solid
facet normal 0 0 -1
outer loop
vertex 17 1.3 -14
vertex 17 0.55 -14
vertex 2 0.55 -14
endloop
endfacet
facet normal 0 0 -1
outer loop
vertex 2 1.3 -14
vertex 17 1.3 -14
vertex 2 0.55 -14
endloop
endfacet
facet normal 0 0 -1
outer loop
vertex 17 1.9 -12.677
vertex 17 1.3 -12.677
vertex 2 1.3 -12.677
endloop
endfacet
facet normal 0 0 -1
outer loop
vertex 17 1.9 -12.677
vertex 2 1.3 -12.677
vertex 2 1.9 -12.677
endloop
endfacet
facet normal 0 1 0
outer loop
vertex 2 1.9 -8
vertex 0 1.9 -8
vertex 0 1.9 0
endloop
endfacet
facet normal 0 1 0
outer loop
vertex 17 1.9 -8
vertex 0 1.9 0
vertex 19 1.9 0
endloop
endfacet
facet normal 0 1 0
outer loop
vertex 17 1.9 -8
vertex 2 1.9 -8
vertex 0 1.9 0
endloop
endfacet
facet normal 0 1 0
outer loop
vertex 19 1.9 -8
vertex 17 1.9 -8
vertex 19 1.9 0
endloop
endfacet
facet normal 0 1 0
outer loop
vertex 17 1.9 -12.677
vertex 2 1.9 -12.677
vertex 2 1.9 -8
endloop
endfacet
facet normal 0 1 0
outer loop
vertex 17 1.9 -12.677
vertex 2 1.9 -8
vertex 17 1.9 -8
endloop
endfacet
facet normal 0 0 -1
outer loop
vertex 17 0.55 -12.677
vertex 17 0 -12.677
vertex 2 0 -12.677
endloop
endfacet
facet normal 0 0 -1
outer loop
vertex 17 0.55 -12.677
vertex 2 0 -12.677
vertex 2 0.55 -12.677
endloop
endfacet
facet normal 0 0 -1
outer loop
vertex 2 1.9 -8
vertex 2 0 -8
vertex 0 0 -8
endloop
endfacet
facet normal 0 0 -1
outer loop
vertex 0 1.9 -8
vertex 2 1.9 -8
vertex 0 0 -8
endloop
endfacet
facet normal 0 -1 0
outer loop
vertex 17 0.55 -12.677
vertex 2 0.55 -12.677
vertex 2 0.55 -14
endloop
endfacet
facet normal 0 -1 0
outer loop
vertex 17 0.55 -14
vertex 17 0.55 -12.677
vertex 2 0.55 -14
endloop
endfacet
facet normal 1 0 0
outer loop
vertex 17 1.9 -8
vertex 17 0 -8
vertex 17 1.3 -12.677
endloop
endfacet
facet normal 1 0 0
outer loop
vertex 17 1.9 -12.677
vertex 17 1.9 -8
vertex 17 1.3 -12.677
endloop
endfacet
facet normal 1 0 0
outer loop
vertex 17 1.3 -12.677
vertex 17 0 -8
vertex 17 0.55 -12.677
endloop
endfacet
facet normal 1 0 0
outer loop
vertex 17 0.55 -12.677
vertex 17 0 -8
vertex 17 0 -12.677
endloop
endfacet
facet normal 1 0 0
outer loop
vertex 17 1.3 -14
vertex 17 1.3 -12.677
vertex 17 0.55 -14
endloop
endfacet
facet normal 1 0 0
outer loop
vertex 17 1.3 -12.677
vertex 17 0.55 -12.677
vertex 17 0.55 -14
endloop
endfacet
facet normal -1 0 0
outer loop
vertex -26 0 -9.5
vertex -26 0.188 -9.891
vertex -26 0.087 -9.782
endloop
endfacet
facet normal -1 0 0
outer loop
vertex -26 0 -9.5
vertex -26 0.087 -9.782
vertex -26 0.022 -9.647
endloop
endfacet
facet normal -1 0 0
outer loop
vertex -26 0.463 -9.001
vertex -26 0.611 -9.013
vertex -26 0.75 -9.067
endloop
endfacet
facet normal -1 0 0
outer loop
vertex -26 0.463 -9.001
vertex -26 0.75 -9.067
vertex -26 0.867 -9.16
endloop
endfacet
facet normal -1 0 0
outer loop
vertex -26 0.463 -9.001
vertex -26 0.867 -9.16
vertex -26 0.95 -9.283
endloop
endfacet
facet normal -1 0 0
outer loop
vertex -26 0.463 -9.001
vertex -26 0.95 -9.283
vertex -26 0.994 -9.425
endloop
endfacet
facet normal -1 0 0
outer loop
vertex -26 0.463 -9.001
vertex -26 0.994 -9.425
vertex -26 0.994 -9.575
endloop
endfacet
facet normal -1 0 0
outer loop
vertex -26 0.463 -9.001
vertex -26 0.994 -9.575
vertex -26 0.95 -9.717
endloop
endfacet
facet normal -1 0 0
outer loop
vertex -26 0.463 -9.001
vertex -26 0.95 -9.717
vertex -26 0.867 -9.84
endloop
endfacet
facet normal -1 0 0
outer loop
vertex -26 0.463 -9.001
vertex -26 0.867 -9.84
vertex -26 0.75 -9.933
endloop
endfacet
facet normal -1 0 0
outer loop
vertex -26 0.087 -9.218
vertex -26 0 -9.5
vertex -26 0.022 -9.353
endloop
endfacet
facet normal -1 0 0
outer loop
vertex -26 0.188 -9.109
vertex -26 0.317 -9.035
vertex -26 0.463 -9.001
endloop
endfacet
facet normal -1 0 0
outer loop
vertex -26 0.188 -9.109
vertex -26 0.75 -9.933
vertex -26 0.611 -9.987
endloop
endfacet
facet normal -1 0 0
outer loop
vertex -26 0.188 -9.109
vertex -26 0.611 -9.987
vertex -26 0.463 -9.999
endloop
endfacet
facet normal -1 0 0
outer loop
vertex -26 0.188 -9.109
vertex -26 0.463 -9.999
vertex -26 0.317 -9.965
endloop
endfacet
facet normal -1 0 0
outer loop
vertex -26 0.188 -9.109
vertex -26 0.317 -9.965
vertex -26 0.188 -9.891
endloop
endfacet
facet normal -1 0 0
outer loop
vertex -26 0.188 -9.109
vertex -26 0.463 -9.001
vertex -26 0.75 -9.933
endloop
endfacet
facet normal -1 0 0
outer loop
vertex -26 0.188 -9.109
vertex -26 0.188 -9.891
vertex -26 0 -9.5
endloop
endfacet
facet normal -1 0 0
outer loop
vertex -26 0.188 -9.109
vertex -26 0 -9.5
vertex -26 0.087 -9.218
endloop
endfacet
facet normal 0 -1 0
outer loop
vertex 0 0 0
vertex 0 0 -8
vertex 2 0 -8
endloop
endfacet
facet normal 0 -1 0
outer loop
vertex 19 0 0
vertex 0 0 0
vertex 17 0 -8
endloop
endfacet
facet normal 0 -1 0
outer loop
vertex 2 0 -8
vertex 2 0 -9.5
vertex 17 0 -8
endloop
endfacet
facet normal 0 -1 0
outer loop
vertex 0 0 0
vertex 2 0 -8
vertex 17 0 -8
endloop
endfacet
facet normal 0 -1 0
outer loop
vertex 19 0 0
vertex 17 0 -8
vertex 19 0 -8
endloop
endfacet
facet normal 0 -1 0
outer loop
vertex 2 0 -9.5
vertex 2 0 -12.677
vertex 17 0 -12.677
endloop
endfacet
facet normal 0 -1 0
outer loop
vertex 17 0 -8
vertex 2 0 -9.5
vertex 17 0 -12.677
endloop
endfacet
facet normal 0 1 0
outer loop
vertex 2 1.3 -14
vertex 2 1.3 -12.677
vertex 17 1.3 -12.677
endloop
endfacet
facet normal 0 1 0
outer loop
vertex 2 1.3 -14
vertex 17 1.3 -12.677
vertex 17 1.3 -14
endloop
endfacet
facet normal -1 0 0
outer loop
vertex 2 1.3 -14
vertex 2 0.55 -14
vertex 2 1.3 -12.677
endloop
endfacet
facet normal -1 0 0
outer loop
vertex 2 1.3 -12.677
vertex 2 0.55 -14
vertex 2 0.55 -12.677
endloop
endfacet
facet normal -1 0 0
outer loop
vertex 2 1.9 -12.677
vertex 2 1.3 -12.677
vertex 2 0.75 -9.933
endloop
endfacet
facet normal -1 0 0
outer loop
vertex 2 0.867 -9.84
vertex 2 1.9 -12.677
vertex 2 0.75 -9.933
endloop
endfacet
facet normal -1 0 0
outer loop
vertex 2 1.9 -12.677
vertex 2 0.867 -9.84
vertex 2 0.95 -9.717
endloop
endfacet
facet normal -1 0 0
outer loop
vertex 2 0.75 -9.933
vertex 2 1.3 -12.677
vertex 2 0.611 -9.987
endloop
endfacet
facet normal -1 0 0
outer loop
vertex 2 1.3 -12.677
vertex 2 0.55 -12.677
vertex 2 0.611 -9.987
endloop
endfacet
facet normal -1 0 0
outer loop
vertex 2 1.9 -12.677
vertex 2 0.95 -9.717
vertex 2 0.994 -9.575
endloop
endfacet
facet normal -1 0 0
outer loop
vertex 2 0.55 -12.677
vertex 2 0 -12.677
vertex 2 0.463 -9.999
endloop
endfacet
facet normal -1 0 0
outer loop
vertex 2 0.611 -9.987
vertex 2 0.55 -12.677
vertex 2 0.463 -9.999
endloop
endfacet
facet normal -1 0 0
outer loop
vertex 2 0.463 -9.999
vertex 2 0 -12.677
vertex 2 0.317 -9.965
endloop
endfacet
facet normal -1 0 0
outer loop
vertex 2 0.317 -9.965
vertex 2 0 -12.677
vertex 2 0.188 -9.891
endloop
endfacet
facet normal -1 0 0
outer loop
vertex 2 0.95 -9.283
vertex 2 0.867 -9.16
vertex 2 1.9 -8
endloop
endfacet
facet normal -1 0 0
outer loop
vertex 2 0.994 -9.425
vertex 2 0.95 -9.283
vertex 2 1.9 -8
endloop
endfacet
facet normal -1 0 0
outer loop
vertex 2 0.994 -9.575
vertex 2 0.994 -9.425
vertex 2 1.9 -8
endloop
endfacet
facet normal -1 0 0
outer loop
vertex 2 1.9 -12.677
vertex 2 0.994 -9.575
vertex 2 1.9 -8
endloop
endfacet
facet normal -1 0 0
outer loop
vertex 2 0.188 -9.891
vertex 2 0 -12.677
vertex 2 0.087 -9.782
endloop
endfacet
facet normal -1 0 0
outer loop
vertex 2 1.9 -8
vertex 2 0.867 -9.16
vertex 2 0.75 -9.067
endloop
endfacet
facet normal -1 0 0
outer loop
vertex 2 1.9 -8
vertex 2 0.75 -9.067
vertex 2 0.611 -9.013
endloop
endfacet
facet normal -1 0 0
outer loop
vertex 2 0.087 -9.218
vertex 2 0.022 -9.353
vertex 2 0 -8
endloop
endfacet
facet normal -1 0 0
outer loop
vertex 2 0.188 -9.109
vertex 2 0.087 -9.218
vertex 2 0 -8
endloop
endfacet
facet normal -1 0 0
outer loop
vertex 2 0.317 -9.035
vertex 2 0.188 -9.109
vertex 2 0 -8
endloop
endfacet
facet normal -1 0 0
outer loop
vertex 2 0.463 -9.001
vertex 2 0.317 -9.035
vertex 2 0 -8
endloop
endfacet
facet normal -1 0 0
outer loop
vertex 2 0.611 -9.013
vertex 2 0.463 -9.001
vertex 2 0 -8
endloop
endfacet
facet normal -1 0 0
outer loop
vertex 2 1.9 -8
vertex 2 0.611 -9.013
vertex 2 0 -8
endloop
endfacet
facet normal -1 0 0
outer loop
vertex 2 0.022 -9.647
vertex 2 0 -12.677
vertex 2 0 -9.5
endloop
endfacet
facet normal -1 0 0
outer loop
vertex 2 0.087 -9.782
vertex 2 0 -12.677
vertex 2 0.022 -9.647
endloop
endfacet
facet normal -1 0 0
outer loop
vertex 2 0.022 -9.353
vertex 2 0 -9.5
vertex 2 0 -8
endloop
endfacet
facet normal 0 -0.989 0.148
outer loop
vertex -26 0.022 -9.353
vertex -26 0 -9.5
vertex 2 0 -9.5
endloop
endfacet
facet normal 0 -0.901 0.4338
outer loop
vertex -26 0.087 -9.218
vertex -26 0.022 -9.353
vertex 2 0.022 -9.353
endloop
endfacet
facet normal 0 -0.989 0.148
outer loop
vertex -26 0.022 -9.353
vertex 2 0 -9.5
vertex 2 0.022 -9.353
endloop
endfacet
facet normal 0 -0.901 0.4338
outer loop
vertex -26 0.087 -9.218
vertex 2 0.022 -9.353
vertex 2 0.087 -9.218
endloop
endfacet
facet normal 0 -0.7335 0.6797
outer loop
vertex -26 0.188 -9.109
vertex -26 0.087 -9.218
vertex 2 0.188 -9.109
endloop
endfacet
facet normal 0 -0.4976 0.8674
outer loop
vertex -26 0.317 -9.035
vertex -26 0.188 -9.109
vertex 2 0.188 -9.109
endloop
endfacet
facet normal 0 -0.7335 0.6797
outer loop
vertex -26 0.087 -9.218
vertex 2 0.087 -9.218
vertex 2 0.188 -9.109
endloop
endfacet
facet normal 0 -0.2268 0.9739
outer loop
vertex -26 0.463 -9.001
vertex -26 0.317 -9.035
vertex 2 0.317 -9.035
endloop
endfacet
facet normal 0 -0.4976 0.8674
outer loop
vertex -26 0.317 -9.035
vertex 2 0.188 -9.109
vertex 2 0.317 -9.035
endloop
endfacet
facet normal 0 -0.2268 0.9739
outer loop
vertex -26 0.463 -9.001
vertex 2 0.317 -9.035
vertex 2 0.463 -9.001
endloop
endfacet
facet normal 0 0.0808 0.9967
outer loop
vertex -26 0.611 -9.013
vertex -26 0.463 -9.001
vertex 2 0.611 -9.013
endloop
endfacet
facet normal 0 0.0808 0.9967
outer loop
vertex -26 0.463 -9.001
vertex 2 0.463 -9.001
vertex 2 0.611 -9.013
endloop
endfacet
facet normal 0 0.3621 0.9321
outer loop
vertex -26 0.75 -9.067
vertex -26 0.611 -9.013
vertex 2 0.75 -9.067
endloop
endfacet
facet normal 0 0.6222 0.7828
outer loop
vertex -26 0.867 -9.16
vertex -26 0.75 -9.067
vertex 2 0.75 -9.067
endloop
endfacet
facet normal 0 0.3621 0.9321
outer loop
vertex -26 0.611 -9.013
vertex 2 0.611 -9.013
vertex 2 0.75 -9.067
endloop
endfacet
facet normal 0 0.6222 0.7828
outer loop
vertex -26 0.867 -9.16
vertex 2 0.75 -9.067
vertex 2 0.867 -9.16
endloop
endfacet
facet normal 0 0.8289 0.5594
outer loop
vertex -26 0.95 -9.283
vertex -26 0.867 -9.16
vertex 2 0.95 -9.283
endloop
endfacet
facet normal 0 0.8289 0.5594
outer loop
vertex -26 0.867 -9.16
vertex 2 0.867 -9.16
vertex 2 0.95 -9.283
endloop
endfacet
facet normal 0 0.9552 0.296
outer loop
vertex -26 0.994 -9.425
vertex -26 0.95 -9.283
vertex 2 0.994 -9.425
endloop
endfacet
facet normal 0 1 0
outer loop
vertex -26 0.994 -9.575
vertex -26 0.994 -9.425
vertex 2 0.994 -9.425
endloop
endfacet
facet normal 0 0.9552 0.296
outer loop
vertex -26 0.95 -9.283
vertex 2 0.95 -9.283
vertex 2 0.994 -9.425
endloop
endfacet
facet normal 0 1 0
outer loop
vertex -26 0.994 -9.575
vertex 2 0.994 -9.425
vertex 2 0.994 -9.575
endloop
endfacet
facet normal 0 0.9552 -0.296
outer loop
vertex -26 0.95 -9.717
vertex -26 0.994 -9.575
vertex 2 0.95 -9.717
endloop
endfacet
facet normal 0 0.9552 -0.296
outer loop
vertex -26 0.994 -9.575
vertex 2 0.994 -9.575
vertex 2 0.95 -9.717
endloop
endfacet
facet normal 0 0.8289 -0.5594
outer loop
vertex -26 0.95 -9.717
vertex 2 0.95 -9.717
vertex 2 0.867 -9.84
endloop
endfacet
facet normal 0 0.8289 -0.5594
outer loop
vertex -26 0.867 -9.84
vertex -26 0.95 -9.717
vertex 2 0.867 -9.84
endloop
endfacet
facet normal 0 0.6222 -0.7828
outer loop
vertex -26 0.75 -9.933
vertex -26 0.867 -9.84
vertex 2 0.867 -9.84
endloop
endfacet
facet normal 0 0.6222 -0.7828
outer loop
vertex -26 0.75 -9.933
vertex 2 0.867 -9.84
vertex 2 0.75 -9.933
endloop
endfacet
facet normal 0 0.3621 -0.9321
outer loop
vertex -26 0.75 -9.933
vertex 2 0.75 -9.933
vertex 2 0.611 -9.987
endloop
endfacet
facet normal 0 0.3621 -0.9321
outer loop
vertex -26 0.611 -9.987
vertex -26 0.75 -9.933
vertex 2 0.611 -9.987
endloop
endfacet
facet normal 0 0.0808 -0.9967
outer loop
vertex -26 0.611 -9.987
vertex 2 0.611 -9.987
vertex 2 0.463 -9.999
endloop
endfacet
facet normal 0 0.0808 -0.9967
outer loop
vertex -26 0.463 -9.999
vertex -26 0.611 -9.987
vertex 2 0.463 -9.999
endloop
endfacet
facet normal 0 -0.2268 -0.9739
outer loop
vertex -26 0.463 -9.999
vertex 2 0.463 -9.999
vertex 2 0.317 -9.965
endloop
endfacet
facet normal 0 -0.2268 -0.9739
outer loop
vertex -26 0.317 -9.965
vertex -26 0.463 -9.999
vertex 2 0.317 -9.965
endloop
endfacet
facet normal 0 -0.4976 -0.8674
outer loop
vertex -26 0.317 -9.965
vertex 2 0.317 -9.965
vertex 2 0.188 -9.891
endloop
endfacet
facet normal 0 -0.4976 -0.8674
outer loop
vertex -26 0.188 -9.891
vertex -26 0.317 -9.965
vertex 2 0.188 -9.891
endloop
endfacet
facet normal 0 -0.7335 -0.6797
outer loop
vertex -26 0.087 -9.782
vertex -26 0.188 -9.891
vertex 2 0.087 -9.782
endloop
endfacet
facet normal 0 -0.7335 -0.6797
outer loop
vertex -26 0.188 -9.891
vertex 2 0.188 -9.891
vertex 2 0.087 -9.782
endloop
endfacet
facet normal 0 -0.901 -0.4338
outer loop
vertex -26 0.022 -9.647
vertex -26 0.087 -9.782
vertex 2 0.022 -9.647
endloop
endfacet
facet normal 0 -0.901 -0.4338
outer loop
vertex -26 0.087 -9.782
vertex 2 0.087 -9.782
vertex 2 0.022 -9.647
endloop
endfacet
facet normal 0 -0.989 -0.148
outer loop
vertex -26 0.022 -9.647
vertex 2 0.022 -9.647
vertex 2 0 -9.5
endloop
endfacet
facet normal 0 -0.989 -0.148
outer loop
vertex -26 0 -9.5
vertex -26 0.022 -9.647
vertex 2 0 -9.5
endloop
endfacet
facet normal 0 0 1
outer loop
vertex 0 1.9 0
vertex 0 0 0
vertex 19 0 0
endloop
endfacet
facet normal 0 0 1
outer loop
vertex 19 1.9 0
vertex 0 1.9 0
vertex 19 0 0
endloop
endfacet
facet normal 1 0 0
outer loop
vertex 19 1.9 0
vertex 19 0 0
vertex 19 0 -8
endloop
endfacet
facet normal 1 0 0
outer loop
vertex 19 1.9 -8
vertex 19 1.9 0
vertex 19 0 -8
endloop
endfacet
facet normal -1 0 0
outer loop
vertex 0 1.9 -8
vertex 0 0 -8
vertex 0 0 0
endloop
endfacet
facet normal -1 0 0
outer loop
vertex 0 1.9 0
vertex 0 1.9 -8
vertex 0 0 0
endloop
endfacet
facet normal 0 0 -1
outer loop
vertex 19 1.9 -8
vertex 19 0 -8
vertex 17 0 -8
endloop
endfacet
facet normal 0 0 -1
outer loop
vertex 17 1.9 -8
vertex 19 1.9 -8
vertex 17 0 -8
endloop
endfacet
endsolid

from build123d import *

# Parameters (mm, degrees)
AUFSATZ_LINEAR_AUSTRAGEN1_DEPTH = 1.9
SKIZZE4_R                       = 0.5
AUFSATZ_LINEAR_AUSTRAGEN3_DEPTH = 28
SKIZZE5_W                       = 1.322669318
SKIZZE5_H                       = 0.6
SKIZZE5_H_2                     = 0.55
SCHNITT_LINEAR_AUSTRAGEN1_DEPTH = 16


with BuildPart() as part:
    # Skizze1 → Aufsatz-Linear austragen1 (new body)
    with BuildSketch(Plane(origin=(0, 0, 0), x_dir=(1, 0, 0), z_dir=(0, 1, 0))):
        Polygon((0, 0), (19, 0), (19, 8), (17, 8), (17, 14), (2, 14), (2, 8), (0, 8), align=None)
    extrude(amount=AUFSATZ_LINEAR_AUSTRAGEN1_DEPTH)

    # Skizze4 → Aufsatz-Linear austragen3 (add)
    with BuildSketch(Plane.ZY.offset(-2)):
        with Locations(Location((-9.5, 0.5, 0), (0, 0, 270))):
            Circle(SKIZZE4_R)
    extrude(amount=AUFSATZ_LINEAR_AUSTRAGEN3_DEPTH)

    # Skizze5 → Schnitt-Linear austragen1 (cut)
    with BuildSketch(Plane(origin=(17, 0, 0), x_dir=(0, 0, -1), z_dir=(1, 0, 0))):
        with Locations((13.338665341, 1.6)):
            Rectangle(SKIZZE5_W, SKIZZE5_H)
        with Locations((13.338665341, 0.275)):
            Rectangle(SKIZZE5_W, SKIZZE5_H_2)
    extrude(amount=-SCHNITT_LINEAR_AUSTRAGEN1_DEPTH, mode=Mode.SUBTRACT)


solid = part.part
